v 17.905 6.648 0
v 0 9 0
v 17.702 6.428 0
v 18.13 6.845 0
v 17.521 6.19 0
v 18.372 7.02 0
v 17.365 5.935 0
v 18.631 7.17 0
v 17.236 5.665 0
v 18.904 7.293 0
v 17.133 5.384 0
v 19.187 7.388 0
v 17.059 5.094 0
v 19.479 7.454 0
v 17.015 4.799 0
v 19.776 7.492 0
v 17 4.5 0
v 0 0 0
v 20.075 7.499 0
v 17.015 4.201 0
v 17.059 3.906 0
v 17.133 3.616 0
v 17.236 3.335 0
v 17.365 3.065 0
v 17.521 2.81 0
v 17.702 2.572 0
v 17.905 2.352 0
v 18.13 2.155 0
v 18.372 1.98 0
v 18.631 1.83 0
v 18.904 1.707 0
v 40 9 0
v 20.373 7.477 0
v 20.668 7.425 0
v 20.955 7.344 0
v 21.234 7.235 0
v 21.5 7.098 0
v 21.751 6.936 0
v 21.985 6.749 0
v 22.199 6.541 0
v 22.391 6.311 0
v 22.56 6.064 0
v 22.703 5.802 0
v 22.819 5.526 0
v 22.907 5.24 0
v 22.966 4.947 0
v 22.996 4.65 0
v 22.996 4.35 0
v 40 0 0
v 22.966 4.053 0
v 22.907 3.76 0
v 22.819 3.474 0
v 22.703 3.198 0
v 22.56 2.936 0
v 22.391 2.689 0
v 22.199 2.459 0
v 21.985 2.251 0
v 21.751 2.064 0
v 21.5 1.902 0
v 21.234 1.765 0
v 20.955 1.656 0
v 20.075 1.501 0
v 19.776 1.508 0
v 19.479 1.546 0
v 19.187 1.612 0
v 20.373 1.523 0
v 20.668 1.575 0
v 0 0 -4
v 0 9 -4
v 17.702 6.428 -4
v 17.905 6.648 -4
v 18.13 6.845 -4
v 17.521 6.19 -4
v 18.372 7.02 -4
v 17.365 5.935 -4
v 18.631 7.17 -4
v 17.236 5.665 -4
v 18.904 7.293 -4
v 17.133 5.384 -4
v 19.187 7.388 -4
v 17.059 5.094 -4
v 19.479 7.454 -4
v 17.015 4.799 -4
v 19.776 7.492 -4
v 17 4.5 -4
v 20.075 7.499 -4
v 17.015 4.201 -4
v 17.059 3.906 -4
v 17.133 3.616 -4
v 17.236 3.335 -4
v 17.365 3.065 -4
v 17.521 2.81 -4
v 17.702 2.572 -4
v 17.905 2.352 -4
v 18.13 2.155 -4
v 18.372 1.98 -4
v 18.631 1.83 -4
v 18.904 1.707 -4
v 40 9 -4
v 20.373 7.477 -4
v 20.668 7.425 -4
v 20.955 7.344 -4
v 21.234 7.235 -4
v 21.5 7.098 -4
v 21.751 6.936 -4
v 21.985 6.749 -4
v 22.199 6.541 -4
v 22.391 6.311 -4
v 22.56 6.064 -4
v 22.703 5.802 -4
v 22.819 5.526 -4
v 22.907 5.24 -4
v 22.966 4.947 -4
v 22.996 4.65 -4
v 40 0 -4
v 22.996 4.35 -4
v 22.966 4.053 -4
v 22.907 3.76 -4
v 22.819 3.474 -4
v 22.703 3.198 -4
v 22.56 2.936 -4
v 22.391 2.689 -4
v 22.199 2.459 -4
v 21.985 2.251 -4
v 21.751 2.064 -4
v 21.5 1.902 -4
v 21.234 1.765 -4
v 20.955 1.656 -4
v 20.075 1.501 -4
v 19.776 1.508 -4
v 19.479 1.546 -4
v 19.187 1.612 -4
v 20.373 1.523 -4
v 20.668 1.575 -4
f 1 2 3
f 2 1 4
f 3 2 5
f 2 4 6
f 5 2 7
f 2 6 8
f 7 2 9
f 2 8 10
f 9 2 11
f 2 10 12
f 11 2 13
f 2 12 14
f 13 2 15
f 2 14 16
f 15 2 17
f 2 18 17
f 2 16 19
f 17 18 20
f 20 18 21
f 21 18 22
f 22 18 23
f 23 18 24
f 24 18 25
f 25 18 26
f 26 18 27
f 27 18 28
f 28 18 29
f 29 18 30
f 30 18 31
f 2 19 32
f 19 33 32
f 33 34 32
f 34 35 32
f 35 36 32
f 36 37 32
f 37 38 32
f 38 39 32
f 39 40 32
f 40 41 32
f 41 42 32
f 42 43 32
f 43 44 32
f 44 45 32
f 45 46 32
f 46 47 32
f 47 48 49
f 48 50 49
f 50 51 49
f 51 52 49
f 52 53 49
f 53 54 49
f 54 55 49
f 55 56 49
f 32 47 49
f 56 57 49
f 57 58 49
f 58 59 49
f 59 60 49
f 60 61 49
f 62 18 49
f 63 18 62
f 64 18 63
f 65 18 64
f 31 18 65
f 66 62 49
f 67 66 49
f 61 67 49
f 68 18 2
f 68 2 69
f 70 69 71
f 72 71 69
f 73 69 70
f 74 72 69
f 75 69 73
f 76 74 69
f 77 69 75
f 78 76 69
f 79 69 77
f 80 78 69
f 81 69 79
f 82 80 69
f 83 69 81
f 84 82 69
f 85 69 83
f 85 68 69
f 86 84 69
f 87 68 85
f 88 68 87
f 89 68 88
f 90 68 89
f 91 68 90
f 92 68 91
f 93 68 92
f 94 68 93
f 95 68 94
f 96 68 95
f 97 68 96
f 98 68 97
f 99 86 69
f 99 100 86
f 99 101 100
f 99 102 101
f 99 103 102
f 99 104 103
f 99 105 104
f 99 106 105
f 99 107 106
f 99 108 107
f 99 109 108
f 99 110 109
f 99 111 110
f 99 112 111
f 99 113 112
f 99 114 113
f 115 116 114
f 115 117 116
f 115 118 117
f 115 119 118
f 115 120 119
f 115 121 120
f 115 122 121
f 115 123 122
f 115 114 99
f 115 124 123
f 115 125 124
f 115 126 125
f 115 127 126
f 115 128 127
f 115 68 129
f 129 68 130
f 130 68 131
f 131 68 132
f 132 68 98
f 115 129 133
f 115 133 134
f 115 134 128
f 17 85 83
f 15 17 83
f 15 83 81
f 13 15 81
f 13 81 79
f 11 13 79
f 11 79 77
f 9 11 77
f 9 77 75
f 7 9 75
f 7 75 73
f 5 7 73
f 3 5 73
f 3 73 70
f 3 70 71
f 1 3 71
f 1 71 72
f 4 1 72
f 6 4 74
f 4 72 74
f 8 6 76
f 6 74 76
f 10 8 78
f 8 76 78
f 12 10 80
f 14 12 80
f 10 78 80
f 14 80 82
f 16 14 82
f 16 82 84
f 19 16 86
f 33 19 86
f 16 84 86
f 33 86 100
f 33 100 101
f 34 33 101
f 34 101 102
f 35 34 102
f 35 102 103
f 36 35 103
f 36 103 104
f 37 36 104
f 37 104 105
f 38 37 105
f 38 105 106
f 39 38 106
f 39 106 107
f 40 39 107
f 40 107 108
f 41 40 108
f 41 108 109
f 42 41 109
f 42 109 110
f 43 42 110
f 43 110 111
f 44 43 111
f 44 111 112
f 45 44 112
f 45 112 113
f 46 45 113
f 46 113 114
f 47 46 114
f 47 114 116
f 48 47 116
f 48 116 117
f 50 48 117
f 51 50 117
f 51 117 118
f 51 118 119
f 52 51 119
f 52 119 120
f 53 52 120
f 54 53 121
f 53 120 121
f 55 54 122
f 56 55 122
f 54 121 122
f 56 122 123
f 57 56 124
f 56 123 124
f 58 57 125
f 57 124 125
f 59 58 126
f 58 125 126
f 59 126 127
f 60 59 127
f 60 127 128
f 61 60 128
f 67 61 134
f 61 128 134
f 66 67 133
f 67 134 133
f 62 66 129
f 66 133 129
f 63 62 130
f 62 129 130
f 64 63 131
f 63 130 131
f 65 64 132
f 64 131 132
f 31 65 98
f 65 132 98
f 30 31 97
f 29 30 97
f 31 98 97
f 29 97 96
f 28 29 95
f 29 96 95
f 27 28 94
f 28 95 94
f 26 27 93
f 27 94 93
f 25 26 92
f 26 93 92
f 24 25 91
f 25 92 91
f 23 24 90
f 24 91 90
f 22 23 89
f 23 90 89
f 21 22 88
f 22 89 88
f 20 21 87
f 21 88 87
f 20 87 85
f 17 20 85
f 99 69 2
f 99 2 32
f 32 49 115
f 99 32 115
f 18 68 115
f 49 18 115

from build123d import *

# Parameters (mm, degrees)
SKETCH1_W           = 40
SKETCH1_H           = 4
BOSS_EXTRUDE1_DEPTH = 9
CUT_EXTRUDE1_REACH  = 43.195
SKETCH2_R           = 3


with BuildPart() as part:
    # Sketch1 → Boss-Extrude1 (new body)
    with BuildSketch(Plane(origin=(0, 0, 0), x_dir=(1, 0, 0), z_dir=(0, 1, 0))):
        with Locations((20, 2)):
            Rectangle(SKETCH1_W, SKETCH1_H)
    extrude(amount=BOSS_EXTRUDE1_DEPTH)

    # Sketch2 → Cut-Extrude1 (cut, up to next)
    with BuildSketch(Plane(origin=(0, 0, -4), x_dir=(-1, 0, 0), z_dir=(0, 0, -1)), mode=Mode.PRIVATE) as cut_extrude1_sk1:
        with Locations((-20, 4.5)):
            Circle(SKETCH2_R)
    cut_extrude1_tool1 = extrude(cut_extrude1_sk1.sketch, amount=-CUT_EXTRUDE1_REACH, mode=Mode.PRIVATE) & part.part
    add(cut_extrude1_tool1.solids().sort_by_distance((20, 4.5, -4))[0], mode=Mode.SUBTRACT)


solid = part.part
